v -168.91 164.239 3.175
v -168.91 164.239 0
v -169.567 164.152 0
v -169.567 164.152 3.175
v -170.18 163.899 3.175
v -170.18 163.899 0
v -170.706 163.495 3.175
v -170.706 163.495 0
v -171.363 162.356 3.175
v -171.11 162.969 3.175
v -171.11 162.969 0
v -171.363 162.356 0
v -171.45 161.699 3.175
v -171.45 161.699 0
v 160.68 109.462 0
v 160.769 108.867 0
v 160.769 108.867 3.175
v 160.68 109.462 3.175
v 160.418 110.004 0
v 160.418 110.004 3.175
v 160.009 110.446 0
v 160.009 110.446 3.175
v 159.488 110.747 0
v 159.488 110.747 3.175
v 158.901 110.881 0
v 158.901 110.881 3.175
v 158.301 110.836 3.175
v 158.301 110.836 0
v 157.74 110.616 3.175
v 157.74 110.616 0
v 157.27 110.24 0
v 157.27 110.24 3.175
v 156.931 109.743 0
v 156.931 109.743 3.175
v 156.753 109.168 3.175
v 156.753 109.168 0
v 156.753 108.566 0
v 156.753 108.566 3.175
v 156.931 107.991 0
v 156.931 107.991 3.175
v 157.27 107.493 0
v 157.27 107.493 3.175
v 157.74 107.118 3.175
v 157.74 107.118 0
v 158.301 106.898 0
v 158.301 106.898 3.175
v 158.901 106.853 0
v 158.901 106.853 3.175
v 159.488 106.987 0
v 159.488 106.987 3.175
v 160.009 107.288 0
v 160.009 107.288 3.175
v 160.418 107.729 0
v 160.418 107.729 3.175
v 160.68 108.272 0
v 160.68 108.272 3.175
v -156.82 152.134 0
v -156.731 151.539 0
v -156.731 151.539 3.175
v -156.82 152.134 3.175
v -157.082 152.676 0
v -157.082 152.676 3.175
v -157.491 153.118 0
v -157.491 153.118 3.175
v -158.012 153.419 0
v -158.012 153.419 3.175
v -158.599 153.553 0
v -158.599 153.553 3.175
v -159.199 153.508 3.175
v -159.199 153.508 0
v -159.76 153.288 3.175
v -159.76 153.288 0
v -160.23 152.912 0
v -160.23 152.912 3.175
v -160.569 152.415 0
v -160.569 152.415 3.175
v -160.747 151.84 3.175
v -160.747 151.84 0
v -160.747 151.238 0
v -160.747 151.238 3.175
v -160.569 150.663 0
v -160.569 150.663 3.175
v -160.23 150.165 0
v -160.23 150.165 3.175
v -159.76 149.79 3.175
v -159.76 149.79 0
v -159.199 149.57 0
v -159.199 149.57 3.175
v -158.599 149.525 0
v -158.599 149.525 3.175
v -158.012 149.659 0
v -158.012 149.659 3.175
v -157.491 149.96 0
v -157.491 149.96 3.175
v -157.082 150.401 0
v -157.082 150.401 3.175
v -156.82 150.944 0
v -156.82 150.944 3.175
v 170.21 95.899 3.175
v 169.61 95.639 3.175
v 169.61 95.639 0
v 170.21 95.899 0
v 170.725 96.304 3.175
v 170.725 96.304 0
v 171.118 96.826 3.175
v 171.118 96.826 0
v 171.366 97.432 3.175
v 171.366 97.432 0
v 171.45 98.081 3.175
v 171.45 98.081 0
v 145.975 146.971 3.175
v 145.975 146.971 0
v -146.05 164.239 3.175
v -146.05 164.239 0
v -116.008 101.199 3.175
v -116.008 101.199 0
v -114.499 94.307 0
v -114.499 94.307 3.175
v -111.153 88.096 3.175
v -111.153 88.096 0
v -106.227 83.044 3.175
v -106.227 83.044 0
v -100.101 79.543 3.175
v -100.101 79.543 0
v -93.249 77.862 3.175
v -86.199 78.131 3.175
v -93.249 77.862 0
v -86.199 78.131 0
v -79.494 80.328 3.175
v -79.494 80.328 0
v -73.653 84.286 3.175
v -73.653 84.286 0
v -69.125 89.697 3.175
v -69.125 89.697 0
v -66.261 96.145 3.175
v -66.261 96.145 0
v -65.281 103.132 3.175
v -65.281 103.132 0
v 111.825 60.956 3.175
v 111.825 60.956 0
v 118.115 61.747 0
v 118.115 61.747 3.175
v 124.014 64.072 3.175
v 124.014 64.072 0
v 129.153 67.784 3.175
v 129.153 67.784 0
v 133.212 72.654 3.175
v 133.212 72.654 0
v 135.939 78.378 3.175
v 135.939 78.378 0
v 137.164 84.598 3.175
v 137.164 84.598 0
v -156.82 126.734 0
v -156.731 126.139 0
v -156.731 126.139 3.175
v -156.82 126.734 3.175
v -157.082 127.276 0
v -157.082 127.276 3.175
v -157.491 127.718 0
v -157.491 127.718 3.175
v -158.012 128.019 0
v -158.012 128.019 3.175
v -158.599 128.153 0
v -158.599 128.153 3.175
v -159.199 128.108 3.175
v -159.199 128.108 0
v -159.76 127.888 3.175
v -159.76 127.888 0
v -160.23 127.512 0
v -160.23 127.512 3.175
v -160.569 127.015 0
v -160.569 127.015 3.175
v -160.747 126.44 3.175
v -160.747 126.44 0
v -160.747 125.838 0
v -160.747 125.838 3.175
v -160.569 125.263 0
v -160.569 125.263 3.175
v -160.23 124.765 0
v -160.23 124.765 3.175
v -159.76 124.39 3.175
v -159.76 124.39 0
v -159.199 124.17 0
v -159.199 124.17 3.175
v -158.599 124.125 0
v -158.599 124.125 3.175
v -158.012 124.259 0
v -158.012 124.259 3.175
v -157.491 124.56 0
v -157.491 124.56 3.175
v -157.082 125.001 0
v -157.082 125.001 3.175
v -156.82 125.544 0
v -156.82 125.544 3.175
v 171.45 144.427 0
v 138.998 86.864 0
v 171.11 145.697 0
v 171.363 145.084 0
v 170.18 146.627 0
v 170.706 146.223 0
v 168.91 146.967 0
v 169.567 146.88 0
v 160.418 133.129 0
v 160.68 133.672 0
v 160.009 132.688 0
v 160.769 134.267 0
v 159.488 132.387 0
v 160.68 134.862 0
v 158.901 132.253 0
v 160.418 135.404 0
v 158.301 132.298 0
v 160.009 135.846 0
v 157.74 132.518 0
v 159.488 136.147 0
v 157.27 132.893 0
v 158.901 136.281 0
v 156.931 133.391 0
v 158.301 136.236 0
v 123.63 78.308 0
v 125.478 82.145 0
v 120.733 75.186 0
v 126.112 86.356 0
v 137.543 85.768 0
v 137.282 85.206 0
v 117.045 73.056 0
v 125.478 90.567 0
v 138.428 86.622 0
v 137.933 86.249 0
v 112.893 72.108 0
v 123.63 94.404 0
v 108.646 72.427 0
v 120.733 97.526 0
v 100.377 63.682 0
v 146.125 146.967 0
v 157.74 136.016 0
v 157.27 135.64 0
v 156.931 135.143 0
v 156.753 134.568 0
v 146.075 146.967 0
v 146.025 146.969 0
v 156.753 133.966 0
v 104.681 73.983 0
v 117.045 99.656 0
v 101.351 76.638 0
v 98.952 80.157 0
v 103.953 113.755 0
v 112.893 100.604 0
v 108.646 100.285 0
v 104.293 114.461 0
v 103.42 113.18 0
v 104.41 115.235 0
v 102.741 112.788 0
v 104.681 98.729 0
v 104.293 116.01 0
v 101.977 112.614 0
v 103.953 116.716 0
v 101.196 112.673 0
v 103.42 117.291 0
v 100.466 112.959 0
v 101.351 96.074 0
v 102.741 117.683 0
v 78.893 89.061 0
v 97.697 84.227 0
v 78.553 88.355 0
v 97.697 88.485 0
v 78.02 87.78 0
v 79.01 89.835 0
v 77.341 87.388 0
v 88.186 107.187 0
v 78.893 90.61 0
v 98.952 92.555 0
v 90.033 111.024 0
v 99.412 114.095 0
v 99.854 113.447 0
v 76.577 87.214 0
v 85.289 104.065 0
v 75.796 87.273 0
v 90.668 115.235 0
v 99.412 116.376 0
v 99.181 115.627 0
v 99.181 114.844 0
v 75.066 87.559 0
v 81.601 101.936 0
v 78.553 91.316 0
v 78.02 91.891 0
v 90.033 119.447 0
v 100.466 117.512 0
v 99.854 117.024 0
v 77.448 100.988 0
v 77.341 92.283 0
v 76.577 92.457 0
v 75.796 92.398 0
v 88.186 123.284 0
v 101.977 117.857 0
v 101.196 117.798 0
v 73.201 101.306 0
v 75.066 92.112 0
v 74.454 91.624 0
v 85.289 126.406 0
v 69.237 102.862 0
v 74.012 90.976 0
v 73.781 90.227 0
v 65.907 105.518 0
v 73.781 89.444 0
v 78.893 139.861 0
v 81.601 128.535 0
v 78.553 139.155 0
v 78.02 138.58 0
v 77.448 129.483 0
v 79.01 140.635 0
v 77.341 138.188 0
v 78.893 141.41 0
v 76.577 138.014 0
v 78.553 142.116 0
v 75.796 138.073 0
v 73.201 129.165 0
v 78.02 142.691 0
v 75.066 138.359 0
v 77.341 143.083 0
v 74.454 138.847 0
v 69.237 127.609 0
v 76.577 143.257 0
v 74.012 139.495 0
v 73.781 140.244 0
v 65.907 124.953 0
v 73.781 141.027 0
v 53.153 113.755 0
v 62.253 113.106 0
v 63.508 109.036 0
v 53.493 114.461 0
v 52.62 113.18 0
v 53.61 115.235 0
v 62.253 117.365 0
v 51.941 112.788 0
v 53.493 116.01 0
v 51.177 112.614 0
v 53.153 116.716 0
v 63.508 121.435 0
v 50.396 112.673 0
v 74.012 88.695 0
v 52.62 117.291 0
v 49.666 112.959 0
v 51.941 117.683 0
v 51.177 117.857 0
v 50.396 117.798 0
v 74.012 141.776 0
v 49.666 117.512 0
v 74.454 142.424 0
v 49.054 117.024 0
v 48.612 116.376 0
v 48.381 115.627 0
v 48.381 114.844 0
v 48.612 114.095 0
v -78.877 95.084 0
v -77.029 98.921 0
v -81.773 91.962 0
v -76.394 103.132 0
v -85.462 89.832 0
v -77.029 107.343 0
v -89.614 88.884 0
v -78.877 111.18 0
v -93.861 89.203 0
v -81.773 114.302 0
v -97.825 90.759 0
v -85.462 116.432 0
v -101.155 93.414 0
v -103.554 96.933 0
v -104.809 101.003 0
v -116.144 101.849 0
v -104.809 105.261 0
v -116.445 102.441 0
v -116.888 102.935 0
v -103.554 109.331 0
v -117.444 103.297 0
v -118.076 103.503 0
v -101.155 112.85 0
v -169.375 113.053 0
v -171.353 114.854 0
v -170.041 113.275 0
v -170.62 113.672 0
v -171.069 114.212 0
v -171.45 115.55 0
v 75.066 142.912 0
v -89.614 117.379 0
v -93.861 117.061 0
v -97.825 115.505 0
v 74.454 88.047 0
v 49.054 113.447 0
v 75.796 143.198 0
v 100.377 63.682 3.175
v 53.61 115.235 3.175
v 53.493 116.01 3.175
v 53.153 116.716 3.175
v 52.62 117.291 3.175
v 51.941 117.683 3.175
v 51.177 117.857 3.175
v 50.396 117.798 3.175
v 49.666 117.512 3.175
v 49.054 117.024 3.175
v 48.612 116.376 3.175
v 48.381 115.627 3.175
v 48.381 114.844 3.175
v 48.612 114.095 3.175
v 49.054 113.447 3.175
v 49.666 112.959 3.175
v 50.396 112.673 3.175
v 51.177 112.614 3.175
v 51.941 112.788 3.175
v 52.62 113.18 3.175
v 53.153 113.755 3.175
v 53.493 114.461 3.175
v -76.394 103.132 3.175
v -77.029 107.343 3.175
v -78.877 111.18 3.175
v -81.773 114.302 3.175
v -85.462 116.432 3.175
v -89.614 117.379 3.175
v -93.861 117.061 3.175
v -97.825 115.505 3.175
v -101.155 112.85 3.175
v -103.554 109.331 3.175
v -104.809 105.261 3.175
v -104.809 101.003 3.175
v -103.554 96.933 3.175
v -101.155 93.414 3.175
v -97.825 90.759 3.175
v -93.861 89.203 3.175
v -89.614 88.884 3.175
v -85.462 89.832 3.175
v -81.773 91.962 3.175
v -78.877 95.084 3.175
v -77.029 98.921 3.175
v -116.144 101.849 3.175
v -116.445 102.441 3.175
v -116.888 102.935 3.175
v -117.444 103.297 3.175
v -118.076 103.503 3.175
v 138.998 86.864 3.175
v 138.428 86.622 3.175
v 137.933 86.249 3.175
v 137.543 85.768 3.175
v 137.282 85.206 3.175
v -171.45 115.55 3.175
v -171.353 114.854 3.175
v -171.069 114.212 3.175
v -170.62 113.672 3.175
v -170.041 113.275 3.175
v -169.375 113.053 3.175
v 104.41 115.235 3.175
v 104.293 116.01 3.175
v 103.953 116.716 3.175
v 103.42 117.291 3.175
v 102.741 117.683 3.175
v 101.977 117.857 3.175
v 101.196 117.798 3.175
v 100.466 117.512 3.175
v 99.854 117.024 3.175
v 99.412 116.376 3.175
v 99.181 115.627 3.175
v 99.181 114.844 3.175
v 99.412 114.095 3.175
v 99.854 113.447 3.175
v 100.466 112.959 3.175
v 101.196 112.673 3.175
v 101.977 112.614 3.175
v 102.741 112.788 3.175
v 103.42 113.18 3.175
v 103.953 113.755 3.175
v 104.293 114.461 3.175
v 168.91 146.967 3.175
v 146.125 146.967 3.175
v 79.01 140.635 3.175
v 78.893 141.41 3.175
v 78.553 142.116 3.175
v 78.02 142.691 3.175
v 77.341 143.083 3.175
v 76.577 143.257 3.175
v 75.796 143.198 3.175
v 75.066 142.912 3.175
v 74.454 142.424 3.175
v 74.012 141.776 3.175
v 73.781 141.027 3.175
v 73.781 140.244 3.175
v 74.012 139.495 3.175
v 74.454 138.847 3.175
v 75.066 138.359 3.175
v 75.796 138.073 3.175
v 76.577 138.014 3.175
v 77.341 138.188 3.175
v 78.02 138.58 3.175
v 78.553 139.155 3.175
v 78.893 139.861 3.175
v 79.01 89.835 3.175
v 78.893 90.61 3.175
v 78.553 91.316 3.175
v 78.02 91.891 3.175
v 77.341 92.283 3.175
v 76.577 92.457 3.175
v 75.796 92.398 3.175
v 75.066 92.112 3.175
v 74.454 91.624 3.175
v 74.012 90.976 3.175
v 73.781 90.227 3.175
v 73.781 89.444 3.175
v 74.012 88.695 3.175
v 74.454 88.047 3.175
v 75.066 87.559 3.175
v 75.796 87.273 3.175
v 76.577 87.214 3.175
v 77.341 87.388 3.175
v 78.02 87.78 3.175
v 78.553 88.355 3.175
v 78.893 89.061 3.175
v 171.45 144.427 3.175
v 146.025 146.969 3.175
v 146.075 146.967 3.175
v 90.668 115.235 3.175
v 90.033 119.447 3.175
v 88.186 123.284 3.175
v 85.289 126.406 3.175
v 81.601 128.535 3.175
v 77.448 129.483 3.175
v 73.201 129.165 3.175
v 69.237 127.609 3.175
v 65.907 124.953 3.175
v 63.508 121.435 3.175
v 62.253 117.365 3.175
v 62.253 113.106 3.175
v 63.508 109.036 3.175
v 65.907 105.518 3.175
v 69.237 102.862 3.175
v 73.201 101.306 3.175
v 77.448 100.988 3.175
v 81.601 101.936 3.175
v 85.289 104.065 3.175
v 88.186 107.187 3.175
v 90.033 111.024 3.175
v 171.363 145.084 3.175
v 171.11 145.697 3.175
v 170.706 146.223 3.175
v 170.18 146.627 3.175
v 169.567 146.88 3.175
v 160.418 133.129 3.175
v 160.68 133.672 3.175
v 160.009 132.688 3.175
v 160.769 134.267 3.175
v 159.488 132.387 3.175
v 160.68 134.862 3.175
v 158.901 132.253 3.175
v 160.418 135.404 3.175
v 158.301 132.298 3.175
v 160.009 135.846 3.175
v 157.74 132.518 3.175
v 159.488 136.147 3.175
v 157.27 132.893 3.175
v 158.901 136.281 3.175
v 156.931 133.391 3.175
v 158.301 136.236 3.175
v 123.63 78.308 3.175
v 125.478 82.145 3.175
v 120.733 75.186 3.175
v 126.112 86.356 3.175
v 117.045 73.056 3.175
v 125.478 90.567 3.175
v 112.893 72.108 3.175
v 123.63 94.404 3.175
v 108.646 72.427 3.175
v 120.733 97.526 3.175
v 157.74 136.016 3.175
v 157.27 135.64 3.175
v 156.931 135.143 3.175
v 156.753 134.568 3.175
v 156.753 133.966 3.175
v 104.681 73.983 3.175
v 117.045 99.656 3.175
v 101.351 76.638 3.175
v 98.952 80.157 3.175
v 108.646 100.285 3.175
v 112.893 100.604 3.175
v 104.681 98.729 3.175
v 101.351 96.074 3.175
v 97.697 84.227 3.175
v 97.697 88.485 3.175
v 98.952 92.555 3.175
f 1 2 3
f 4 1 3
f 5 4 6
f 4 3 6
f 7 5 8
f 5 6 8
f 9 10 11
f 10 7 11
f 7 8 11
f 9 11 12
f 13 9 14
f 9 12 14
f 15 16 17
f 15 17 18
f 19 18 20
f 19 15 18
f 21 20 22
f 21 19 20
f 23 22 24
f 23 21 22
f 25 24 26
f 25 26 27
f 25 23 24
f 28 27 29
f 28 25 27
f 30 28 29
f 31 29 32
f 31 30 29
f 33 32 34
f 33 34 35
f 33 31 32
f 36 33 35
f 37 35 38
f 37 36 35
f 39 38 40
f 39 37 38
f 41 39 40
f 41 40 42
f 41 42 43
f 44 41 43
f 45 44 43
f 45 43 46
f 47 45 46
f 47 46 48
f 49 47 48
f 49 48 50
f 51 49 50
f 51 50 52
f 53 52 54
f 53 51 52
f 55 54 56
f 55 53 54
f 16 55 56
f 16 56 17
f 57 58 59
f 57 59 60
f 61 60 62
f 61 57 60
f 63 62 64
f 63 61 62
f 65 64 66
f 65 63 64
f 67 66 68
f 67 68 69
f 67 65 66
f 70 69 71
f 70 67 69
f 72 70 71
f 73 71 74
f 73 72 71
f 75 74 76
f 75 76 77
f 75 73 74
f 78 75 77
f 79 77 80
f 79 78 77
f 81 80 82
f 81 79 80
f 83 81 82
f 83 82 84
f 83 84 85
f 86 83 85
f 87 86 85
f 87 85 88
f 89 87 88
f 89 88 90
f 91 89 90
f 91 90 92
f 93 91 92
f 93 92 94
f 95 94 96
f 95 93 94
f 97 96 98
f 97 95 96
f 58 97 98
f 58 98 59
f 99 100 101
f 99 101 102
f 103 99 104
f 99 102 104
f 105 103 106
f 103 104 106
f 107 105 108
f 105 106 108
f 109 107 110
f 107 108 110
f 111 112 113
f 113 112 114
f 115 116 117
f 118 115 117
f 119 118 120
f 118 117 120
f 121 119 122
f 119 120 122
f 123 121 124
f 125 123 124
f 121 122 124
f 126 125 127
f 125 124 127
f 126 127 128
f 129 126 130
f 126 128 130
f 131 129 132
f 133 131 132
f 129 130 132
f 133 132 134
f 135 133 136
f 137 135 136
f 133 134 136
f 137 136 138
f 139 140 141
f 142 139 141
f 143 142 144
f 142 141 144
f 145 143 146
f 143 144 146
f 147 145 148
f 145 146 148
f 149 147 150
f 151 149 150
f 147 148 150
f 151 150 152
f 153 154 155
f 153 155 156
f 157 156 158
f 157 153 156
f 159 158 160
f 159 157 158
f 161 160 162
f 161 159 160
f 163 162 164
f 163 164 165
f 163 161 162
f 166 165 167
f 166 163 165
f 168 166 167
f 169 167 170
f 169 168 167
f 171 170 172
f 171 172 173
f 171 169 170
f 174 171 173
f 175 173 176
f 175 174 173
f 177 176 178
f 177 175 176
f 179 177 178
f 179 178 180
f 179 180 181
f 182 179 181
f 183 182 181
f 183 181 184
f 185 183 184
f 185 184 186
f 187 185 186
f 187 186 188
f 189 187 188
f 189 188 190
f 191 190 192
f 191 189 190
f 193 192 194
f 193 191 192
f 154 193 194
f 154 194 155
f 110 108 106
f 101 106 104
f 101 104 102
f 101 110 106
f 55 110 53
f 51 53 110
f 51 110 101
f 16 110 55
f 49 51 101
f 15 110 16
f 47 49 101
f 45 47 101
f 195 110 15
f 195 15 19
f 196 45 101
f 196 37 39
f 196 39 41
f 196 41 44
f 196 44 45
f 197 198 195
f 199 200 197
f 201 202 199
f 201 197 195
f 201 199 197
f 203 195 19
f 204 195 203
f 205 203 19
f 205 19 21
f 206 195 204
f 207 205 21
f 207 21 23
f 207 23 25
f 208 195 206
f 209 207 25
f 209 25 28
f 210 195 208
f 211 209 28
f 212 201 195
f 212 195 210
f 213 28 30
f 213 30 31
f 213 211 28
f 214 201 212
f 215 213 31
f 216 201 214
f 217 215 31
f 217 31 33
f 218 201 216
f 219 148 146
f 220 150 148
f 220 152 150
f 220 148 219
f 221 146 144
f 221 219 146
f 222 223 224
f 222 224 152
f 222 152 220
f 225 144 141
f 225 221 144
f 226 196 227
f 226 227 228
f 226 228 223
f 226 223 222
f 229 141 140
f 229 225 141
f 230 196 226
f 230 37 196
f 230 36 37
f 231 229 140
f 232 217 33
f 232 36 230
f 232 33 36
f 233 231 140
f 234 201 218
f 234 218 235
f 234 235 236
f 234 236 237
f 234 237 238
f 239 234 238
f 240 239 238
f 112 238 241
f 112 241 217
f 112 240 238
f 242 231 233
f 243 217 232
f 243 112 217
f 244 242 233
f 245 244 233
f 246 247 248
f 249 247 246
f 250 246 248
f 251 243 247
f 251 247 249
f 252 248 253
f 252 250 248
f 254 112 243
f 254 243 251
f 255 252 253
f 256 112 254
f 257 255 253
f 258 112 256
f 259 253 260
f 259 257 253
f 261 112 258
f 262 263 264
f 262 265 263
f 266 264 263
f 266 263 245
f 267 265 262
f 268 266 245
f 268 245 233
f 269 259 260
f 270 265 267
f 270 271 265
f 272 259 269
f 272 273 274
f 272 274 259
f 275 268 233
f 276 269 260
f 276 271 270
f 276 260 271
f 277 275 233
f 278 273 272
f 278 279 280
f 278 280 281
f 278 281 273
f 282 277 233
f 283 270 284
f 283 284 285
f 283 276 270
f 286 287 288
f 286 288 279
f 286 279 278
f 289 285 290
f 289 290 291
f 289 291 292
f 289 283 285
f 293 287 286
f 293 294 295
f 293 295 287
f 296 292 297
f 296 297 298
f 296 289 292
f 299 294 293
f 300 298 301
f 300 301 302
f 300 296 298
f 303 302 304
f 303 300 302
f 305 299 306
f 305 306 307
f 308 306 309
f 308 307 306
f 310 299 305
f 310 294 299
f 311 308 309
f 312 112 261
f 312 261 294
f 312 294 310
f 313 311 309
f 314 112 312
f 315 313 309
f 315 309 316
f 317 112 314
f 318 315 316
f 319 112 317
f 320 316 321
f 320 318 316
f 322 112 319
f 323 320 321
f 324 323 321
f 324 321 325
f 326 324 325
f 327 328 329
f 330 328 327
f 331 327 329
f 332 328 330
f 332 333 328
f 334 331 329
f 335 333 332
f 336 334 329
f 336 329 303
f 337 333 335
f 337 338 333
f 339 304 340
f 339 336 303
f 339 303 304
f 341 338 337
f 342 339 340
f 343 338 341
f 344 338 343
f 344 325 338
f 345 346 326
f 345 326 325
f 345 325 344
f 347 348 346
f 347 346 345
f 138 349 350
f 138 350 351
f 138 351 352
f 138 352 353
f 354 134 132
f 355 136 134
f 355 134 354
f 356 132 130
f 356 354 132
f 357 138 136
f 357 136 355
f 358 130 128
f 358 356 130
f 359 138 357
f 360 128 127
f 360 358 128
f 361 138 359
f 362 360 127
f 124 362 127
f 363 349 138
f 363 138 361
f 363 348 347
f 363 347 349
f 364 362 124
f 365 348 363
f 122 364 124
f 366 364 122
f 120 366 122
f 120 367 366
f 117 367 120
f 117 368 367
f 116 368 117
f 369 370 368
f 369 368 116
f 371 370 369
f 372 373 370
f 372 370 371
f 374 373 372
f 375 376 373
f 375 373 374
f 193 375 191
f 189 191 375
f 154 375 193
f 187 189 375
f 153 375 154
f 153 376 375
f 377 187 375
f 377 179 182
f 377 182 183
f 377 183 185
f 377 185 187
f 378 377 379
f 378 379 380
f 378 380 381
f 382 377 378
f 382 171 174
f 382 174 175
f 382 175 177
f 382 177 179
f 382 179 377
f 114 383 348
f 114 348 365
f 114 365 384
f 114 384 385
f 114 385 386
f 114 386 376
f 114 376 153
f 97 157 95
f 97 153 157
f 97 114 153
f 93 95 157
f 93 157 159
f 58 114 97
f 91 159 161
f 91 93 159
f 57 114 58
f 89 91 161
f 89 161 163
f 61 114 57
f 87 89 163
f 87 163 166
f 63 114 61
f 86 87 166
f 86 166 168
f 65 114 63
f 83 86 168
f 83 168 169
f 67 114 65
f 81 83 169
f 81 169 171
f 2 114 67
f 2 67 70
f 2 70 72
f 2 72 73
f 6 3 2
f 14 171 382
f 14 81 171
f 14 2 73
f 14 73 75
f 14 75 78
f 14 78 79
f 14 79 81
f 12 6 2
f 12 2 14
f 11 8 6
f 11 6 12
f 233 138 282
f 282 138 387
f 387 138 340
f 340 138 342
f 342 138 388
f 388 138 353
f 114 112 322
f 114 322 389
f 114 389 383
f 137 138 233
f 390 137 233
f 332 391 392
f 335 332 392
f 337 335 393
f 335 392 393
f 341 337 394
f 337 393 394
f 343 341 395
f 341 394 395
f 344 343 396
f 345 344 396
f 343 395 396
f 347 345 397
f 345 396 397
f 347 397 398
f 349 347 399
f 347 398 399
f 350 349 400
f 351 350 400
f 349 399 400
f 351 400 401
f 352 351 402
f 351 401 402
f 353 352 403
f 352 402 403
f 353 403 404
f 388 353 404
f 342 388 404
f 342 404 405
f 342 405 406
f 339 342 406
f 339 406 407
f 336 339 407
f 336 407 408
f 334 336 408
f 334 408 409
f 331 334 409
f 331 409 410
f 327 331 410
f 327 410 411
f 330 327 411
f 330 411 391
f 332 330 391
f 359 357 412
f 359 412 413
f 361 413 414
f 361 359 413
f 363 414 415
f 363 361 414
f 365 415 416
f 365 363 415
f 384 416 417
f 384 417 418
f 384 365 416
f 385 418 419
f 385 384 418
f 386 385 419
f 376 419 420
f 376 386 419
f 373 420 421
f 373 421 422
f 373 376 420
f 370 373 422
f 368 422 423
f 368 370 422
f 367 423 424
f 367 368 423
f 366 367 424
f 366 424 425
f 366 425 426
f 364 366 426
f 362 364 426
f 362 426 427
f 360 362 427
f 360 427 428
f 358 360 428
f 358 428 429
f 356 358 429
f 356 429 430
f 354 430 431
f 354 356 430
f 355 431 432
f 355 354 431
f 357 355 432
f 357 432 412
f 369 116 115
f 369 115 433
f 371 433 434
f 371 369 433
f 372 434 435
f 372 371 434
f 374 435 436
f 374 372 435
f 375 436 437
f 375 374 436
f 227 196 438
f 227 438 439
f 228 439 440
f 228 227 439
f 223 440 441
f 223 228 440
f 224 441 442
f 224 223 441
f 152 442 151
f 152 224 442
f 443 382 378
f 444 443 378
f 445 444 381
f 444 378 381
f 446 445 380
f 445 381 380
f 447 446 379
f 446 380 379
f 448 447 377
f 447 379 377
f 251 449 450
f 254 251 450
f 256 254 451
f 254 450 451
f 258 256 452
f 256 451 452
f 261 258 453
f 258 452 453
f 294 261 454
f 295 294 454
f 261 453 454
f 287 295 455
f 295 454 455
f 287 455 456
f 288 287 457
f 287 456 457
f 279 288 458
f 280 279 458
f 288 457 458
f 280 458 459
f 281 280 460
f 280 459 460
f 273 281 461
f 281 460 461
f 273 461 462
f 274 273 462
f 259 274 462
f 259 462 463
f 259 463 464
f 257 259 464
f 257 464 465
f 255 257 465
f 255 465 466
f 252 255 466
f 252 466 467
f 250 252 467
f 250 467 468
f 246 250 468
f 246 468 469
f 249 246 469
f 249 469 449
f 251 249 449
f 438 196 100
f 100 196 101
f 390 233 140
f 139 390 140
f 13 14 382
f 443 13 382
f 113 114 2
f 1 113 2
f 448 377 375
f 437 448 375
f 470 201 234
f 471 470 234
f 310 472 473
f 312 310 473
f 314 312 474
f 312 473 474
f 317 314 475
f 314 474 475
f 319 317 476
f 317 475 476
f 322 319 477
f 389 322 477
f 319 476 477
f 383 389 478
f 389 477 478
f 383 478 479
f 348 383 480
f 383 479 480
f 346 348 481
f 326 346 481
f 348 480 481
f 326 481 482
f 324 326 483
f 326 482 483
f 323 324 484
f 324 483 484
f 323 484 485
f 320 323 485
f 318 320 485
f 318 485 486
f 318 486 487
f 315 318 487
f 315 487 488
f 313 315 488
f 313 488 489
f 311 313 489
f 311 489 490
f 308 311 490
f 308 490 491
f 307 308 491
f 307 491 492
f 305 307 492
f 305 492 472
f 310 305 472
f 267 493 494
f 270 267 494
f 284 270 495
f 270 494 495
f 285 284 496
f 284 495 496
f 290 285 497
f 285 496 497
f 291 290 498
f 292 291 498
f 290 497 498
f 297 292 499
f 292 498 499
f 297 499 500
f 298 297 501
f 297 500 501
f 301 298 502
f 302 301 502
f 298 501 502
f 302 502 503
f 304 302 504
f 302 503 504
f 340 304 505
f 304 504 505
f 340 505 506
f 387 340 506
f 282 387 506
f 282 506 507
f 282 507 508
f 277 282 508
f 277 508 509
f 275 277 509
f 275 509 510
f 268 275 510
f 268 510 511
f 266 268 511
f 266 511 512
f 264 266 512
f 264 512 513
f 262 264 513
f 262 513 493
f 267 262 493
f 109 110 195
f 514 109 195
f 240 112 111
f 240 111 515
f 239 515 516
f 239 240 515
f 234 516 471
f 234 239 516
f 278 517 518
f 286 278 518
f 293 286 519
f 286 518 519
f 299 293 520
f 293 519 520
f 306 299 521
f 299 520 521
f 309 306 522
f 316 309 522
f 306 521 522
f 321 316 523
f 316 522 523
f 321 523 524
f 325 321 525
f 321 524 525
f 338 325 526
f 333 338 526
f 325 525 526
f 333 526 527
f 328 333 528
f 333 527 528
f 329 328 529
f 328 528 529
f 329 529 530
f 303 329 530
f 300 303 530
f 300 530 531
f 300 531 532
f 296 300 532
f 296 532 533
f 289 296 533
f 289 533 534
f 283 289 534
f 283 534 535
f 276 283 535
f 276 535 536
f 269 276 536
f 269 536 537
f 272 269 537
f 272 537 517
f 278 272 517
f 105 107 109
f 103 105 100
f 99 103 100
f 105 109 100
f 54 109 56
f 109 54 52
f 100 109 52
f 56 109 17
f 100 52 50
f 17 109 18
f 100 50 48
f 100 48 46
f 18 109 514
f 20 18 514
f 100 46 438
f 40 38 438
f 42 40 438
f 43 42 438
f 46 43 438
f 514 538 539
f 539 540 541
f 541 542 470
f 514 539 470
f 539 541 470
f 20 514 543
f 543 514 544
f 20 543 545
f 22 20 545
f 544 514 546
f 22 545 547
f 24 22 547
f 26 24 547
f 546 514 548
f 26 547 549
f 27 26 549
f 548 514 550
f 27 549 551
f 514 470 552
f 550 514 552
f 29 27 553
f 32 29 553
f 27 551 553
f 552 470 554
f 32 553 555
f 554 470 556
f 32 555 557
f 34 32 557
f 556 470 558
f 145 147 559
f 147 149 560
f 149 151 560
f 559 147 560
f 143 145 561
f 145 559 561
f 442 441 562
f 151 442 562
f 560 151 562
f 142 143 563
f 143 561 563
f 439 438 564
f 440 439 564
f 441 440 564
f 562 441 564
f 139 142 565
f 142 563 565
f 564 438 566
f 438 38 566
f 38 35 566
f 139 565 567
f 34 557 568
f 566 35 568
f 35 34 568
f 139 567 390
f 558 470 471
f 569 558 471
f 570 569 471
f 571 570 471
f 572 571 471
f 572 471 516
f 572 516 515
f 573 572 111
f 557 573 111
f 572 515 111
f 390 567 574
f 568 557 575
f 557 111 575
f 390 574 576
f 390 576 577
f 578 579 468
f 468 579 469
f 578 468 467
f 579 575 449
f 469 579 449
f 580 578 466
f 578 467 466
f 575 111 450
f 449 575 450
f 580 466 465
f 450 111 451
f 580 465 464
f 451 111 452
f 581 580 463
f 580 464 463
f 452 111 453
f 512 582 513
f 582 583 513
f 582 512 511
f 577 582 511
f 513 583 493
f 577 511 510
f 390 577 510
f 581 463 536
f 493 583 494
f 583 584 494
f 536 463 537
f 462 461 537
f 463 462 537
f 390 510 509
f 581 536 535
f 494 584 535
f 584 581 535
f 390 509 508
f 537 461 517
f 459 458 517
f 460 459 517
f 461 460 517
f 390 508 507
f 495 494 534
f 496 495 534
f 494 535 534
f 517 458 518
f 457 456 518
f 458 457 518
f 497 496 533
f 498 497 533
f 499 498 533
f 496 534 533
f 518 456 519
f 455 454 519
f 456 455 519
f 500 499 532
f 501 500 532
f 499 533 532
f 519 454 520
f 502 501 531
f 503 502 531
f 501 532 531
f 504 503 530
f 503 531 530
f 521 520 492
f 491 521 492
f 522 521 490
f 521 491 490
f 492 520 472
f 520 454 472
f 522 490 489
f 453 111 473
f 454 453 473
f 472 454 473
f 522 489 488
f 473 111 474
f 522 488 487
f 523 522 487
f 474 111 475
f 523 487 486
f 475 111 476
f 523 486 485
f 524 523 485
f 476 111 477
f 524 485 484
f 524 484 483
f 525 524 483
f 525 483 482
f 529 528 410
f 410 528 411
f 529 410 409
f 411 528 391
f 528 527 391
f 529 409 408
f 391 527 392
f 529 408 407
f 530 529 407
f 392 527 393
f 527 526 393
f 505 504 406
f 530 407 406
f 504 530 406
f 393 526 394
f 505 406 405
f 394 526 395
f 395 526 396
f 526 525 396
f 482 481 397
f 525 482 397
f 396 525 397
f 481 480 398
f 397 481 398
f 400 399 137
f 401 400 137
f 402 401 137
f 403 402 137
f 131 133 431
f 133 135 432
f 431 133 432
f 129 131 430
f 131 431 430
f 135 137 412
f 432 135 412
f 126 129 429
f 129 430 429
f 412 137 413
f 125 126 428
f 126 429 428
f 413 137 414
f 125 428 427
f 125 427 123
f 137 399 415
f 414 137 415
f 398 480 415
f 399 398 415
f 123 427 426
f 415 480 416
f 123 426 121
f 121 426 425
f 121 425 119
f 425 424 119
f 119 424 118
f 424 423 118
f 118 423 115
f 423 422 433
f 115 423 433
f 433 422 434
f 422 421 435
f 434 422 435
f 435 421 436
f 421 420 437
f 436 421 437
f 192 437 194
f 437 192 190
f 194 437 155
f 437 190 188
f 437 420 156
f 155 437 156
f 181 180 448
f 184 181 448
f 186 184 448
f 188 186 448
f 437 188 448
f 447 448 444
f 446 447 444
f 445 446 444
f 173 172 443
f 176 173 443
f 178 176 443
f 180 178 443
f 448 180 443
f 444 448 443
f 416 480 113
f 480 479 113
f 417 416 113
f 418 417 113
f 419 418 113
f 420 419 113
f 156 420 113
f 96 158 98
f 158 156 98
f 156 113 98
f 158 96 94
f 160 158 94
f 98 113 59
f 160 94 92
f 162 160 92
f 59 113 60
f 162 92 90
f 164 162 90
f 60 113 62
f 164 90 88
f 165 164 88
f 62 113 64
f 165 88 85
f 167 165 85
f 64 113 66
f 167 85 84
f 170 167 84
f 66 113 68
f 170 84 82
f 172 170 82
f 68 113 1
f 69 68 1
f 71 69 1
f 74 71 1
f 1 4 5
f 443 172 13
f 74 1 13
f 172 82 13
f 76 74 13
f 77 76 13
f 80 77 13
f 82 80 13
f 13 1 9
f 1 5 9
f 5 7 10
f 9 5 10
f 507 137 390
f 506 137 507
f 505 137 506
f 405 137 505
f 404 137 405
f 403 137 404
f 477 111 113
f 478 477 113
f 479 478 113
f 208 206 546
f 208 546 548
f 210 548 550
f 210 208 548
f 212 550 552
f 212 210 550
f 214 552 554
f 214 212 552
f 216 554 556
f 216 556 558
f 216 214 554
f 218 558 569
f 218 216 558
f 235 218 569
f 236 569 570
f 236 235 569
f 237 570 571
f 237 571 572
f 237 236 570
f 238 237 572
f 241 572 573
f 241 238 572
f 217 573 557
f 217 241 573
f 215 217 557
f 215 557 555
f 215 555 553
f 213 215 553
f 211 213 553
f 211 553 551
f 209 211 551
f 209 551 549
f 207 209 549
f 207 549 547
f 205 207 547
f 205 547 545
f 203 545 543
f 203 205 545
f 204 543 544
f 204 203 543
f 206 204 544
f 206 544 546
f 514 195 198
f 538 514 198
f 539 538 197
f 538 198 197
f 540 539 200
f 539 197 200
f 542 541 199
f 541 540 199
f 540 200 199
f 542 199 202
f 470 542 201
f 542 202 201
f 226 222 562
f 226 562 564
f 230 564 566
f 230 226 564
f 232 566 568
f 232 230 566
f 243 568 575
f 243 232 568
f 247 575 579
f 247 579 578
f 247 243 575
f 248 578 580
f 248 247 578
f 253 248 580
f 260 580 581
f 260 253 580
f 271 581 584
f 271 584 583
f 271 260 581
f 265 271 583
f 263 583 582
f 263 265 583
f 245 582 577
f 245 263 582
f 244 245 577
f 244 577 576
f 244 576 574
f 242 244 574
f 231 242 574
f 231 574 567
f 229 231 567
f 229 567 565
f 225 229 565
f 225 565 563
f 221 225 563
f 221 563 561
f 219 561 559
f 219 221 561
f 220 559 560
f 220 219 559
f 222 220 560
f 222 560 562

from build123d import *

# Parameters (mm, degrees)
SKETCH1_R           = 14.2875
SKETCH1_R_2         = 2.0193
BOSS_EXTRUDE1_DEPTH = 3.175
FILLET1_R           = 2.54
SKETCH2_R           = 14.2875
SKETCH2_R_2         = 2.6289
CUT_EXTRUDE1_DEPTH  = 238.443914509


with BuildPart() as part:
    # Sketch1 → Boss-Extrude1 (new body)
    with BuildSketch(Plane.XY):
        with BuildLine():
            Line((146.05, 146.96694), (-146.05, 164.23894))
            Line((-146.05, 164.23894), (-171.45, 164.23894))
            Line((-171.45, 164.23894), (-171.45, 113.43894))
            Line((-171.45, 113.43894), (-116.081416722, 103.131947821))
            ThreePointArc((-116.081416722, 103.131947821), (-90.681416722, 77.731947821), (-65.281416722, 103.131947821))
            Line((-65.281416722, 103.131947821), (100.376646224, 63.682232473))
            Line((100.376646224, 63.682232473), (111.82489431, 60.955953292))
            ThreePointArc((111.82489431, 60.955953292), (129.785406552, 68.395441049), (137.22489431, 86.355953292))
            Line((137.22489431, 86.355953292), (171.45, 96.16694))
            Line((171.45, 96.16694), (171.45, 146.96694))
            Line((171.45, 146.96694), (146.05, 146.96694))
        make_face()
        with Locations((-90.681416722, 103.131947821)):
            Circle(SKETCH1_R, mode=Mode.SUBTRACT)
        with Locations((111.82489431, 86.355953292)):
            Circle(SKETCH1_R, mode=Mode.SUBTRACT)
        with Locations((158.75, 108.86694)):
            Circle(SKETCH1_R_2, mode=Mode.SUBTRACT)
        with Locations((-158.75, 126.13894)):
            Circle(SKETCH1_R_2, mode=Mode.SUBTRACT)
        with Locations((-158.75, 151.53894)):
            Circle(SKETCH1_R_2, mode=Mode.SUBTRACT)
        with Locations((158.75, 134.26694)):
            Circle(SKETCH1_R_2, mode=Mode.SUBTRACT)
    extrude(amount=BOSS_EXTRUDE1_DEPTH)

    # Fillet1
    # the kernel refuses this fillet: 2.54 mm, written as the material it adds along each edge
    with BuildSketch(Plane(origin=(-116.081416722, 103.131947821, 0), x_dir=(0.03807134416902504, -0.9992750235811778, 0), z_dir=(0, 0, 1))) as fillet1_piece_1:
        with BuildLine():
            CenterArc((2.030725498, -2.53815856), FILLET1_R, 92.181854631, 75.091245619)
            Line((-0.446869803, -1.978585935), (0, 0))
            ThreePointArc((0, 0), (0.967012142, -0.018414401), (1.934024284, 0))
        make_face()
    extrude(amount=3.175)
    with BuildSketch(Plane(origin=(146.05, 146.96694, 0), x_dir=(-0.9982563668513765, 0.05902733299658733, 0), z_dir=(0, 0, 1))) as fillet1_piece_2:
        with BuildLine():
            CenterArc((FILLET1_R * 0.0295394194538, -FILLET1_R), FILLET1_R, 90, 3.383984094)
            Line((-FILLET1_R * 0.0294879135427, -FILLET1_R * 0.00174363314863), (0, 0))
            Line((0, 0), (FILLET1_R * 0.0295394194537, 0))
        make_face()
    extrude(amount=3.175)
    with BuildSketch(Plane(origin=(137.22489431, 86.355953292, 0), x_dir=(0.9612833075503745, 0.2755619760144931, 0), z_dir=(0, 0, 1))) as fillet1_piece_3:
        with BuildLine():
            CenterArc((1.844513026, -2.54), FILLET1_R, 90, 70.036589556)
            ThreePointArc((-0.542860523, -1.672793255), (-0.256948075, -0.841096436), (0, 0))
            Line((0, 0), (1.844513026, 0))
        make_face()
    extrude(amount=3.175)
    # the kernel refuses this fillet: 2.54 mm, written as the material it takes off along each edge
    with BuildSketch(Plane(origin=(-171.45, 113.43894, -5.277017888), x_dir=(0, 1, 0), z_dir=(0, 0, 1))) as fillet1_2_piece_1:
        with BuildLine():
            CenterArc((FILLET1_R * 0.831026439026, -FILLET1_R), FILLET1_R, 90, 79.454954882)
            Line((-FILLET1_R * 0.152084893732, -FILLET1_R * 0.816991510029), (0, 0))
            Line((0, 0), (FILLET1_R * 0.831026439026, 0))
        make_face()
    extrude(amount=13.729035776, mode=Mode.SUBTRACT)
    with BuildSketch(Plane(origin=(-171.45, 164.23894, -6.35), x_dir=(1, 0, 0), z_dir=(0, 0, 1)), Plane(origin=(171.45, 146.96694, -6.35), x_dir=(0, -1, 0), z_dir=(0, 0, 1))) as fillet1_2_piece_2:
        with BuildLine():
            CenterArc((FILLET1_R, -FILLET1_R), FILLET1_R, 90, 90)
            Line((0, -FILLET1_R), (0, 0))
            Line((0, 0), (FILLET1_R, 0))
        make_face()
    extrude(amount=15.875, mode=Mode.SUBTRACT)
    with BuildSketch(Plane(origin=(171.45, 96.16694, -4.78545858), x_dir=(-0.9612833075503753, -0.2755619760144905, 0), z_dir=(0, 0, 1))) as fillet1_2_piece_3:
        with BuildLine():
            CenterArc((FILLET1_R * 0.753615524472, -FILLET1_R), FILLET1_R, 90, 74.004492945)
            Line((-FILLET1_R * 0.207667783079, -FILLET1_R * 0.724438023986), (0, 0))
            Line((0, 0), (FILLET1_R * 0.753615524472, 0))
        make_face()
    extrude(amount=12.745917161, mode=Mode.SUBTRACT)

    # Sketch2 → Cut-Extrude1 (cut, through all)
    with BuildSketch(Plane.XY.offset(3.175)):
        with Locations((76.380709582, 115.23549915)):
            Circle(SKETCH2_R)
        with Locations((76.380709582, 140.63549915)):
            Circle(SKETCH2_R_2)
        with Locations((101.780709582, 115.23549915)):
            Circle(SKETCH2_R_2)
        with Locations((76.380709582, 89.83549915)):
            Circle(SKETCH2_R_2)
        with Locations((50.980709582, 115.23549915)):
            Circle(SKETCH2_R_2)
    extrude(amount=-CUT_EXTRUDE1_DEPTH, mode=Mode.SUBTRACT)


solid = part.part
